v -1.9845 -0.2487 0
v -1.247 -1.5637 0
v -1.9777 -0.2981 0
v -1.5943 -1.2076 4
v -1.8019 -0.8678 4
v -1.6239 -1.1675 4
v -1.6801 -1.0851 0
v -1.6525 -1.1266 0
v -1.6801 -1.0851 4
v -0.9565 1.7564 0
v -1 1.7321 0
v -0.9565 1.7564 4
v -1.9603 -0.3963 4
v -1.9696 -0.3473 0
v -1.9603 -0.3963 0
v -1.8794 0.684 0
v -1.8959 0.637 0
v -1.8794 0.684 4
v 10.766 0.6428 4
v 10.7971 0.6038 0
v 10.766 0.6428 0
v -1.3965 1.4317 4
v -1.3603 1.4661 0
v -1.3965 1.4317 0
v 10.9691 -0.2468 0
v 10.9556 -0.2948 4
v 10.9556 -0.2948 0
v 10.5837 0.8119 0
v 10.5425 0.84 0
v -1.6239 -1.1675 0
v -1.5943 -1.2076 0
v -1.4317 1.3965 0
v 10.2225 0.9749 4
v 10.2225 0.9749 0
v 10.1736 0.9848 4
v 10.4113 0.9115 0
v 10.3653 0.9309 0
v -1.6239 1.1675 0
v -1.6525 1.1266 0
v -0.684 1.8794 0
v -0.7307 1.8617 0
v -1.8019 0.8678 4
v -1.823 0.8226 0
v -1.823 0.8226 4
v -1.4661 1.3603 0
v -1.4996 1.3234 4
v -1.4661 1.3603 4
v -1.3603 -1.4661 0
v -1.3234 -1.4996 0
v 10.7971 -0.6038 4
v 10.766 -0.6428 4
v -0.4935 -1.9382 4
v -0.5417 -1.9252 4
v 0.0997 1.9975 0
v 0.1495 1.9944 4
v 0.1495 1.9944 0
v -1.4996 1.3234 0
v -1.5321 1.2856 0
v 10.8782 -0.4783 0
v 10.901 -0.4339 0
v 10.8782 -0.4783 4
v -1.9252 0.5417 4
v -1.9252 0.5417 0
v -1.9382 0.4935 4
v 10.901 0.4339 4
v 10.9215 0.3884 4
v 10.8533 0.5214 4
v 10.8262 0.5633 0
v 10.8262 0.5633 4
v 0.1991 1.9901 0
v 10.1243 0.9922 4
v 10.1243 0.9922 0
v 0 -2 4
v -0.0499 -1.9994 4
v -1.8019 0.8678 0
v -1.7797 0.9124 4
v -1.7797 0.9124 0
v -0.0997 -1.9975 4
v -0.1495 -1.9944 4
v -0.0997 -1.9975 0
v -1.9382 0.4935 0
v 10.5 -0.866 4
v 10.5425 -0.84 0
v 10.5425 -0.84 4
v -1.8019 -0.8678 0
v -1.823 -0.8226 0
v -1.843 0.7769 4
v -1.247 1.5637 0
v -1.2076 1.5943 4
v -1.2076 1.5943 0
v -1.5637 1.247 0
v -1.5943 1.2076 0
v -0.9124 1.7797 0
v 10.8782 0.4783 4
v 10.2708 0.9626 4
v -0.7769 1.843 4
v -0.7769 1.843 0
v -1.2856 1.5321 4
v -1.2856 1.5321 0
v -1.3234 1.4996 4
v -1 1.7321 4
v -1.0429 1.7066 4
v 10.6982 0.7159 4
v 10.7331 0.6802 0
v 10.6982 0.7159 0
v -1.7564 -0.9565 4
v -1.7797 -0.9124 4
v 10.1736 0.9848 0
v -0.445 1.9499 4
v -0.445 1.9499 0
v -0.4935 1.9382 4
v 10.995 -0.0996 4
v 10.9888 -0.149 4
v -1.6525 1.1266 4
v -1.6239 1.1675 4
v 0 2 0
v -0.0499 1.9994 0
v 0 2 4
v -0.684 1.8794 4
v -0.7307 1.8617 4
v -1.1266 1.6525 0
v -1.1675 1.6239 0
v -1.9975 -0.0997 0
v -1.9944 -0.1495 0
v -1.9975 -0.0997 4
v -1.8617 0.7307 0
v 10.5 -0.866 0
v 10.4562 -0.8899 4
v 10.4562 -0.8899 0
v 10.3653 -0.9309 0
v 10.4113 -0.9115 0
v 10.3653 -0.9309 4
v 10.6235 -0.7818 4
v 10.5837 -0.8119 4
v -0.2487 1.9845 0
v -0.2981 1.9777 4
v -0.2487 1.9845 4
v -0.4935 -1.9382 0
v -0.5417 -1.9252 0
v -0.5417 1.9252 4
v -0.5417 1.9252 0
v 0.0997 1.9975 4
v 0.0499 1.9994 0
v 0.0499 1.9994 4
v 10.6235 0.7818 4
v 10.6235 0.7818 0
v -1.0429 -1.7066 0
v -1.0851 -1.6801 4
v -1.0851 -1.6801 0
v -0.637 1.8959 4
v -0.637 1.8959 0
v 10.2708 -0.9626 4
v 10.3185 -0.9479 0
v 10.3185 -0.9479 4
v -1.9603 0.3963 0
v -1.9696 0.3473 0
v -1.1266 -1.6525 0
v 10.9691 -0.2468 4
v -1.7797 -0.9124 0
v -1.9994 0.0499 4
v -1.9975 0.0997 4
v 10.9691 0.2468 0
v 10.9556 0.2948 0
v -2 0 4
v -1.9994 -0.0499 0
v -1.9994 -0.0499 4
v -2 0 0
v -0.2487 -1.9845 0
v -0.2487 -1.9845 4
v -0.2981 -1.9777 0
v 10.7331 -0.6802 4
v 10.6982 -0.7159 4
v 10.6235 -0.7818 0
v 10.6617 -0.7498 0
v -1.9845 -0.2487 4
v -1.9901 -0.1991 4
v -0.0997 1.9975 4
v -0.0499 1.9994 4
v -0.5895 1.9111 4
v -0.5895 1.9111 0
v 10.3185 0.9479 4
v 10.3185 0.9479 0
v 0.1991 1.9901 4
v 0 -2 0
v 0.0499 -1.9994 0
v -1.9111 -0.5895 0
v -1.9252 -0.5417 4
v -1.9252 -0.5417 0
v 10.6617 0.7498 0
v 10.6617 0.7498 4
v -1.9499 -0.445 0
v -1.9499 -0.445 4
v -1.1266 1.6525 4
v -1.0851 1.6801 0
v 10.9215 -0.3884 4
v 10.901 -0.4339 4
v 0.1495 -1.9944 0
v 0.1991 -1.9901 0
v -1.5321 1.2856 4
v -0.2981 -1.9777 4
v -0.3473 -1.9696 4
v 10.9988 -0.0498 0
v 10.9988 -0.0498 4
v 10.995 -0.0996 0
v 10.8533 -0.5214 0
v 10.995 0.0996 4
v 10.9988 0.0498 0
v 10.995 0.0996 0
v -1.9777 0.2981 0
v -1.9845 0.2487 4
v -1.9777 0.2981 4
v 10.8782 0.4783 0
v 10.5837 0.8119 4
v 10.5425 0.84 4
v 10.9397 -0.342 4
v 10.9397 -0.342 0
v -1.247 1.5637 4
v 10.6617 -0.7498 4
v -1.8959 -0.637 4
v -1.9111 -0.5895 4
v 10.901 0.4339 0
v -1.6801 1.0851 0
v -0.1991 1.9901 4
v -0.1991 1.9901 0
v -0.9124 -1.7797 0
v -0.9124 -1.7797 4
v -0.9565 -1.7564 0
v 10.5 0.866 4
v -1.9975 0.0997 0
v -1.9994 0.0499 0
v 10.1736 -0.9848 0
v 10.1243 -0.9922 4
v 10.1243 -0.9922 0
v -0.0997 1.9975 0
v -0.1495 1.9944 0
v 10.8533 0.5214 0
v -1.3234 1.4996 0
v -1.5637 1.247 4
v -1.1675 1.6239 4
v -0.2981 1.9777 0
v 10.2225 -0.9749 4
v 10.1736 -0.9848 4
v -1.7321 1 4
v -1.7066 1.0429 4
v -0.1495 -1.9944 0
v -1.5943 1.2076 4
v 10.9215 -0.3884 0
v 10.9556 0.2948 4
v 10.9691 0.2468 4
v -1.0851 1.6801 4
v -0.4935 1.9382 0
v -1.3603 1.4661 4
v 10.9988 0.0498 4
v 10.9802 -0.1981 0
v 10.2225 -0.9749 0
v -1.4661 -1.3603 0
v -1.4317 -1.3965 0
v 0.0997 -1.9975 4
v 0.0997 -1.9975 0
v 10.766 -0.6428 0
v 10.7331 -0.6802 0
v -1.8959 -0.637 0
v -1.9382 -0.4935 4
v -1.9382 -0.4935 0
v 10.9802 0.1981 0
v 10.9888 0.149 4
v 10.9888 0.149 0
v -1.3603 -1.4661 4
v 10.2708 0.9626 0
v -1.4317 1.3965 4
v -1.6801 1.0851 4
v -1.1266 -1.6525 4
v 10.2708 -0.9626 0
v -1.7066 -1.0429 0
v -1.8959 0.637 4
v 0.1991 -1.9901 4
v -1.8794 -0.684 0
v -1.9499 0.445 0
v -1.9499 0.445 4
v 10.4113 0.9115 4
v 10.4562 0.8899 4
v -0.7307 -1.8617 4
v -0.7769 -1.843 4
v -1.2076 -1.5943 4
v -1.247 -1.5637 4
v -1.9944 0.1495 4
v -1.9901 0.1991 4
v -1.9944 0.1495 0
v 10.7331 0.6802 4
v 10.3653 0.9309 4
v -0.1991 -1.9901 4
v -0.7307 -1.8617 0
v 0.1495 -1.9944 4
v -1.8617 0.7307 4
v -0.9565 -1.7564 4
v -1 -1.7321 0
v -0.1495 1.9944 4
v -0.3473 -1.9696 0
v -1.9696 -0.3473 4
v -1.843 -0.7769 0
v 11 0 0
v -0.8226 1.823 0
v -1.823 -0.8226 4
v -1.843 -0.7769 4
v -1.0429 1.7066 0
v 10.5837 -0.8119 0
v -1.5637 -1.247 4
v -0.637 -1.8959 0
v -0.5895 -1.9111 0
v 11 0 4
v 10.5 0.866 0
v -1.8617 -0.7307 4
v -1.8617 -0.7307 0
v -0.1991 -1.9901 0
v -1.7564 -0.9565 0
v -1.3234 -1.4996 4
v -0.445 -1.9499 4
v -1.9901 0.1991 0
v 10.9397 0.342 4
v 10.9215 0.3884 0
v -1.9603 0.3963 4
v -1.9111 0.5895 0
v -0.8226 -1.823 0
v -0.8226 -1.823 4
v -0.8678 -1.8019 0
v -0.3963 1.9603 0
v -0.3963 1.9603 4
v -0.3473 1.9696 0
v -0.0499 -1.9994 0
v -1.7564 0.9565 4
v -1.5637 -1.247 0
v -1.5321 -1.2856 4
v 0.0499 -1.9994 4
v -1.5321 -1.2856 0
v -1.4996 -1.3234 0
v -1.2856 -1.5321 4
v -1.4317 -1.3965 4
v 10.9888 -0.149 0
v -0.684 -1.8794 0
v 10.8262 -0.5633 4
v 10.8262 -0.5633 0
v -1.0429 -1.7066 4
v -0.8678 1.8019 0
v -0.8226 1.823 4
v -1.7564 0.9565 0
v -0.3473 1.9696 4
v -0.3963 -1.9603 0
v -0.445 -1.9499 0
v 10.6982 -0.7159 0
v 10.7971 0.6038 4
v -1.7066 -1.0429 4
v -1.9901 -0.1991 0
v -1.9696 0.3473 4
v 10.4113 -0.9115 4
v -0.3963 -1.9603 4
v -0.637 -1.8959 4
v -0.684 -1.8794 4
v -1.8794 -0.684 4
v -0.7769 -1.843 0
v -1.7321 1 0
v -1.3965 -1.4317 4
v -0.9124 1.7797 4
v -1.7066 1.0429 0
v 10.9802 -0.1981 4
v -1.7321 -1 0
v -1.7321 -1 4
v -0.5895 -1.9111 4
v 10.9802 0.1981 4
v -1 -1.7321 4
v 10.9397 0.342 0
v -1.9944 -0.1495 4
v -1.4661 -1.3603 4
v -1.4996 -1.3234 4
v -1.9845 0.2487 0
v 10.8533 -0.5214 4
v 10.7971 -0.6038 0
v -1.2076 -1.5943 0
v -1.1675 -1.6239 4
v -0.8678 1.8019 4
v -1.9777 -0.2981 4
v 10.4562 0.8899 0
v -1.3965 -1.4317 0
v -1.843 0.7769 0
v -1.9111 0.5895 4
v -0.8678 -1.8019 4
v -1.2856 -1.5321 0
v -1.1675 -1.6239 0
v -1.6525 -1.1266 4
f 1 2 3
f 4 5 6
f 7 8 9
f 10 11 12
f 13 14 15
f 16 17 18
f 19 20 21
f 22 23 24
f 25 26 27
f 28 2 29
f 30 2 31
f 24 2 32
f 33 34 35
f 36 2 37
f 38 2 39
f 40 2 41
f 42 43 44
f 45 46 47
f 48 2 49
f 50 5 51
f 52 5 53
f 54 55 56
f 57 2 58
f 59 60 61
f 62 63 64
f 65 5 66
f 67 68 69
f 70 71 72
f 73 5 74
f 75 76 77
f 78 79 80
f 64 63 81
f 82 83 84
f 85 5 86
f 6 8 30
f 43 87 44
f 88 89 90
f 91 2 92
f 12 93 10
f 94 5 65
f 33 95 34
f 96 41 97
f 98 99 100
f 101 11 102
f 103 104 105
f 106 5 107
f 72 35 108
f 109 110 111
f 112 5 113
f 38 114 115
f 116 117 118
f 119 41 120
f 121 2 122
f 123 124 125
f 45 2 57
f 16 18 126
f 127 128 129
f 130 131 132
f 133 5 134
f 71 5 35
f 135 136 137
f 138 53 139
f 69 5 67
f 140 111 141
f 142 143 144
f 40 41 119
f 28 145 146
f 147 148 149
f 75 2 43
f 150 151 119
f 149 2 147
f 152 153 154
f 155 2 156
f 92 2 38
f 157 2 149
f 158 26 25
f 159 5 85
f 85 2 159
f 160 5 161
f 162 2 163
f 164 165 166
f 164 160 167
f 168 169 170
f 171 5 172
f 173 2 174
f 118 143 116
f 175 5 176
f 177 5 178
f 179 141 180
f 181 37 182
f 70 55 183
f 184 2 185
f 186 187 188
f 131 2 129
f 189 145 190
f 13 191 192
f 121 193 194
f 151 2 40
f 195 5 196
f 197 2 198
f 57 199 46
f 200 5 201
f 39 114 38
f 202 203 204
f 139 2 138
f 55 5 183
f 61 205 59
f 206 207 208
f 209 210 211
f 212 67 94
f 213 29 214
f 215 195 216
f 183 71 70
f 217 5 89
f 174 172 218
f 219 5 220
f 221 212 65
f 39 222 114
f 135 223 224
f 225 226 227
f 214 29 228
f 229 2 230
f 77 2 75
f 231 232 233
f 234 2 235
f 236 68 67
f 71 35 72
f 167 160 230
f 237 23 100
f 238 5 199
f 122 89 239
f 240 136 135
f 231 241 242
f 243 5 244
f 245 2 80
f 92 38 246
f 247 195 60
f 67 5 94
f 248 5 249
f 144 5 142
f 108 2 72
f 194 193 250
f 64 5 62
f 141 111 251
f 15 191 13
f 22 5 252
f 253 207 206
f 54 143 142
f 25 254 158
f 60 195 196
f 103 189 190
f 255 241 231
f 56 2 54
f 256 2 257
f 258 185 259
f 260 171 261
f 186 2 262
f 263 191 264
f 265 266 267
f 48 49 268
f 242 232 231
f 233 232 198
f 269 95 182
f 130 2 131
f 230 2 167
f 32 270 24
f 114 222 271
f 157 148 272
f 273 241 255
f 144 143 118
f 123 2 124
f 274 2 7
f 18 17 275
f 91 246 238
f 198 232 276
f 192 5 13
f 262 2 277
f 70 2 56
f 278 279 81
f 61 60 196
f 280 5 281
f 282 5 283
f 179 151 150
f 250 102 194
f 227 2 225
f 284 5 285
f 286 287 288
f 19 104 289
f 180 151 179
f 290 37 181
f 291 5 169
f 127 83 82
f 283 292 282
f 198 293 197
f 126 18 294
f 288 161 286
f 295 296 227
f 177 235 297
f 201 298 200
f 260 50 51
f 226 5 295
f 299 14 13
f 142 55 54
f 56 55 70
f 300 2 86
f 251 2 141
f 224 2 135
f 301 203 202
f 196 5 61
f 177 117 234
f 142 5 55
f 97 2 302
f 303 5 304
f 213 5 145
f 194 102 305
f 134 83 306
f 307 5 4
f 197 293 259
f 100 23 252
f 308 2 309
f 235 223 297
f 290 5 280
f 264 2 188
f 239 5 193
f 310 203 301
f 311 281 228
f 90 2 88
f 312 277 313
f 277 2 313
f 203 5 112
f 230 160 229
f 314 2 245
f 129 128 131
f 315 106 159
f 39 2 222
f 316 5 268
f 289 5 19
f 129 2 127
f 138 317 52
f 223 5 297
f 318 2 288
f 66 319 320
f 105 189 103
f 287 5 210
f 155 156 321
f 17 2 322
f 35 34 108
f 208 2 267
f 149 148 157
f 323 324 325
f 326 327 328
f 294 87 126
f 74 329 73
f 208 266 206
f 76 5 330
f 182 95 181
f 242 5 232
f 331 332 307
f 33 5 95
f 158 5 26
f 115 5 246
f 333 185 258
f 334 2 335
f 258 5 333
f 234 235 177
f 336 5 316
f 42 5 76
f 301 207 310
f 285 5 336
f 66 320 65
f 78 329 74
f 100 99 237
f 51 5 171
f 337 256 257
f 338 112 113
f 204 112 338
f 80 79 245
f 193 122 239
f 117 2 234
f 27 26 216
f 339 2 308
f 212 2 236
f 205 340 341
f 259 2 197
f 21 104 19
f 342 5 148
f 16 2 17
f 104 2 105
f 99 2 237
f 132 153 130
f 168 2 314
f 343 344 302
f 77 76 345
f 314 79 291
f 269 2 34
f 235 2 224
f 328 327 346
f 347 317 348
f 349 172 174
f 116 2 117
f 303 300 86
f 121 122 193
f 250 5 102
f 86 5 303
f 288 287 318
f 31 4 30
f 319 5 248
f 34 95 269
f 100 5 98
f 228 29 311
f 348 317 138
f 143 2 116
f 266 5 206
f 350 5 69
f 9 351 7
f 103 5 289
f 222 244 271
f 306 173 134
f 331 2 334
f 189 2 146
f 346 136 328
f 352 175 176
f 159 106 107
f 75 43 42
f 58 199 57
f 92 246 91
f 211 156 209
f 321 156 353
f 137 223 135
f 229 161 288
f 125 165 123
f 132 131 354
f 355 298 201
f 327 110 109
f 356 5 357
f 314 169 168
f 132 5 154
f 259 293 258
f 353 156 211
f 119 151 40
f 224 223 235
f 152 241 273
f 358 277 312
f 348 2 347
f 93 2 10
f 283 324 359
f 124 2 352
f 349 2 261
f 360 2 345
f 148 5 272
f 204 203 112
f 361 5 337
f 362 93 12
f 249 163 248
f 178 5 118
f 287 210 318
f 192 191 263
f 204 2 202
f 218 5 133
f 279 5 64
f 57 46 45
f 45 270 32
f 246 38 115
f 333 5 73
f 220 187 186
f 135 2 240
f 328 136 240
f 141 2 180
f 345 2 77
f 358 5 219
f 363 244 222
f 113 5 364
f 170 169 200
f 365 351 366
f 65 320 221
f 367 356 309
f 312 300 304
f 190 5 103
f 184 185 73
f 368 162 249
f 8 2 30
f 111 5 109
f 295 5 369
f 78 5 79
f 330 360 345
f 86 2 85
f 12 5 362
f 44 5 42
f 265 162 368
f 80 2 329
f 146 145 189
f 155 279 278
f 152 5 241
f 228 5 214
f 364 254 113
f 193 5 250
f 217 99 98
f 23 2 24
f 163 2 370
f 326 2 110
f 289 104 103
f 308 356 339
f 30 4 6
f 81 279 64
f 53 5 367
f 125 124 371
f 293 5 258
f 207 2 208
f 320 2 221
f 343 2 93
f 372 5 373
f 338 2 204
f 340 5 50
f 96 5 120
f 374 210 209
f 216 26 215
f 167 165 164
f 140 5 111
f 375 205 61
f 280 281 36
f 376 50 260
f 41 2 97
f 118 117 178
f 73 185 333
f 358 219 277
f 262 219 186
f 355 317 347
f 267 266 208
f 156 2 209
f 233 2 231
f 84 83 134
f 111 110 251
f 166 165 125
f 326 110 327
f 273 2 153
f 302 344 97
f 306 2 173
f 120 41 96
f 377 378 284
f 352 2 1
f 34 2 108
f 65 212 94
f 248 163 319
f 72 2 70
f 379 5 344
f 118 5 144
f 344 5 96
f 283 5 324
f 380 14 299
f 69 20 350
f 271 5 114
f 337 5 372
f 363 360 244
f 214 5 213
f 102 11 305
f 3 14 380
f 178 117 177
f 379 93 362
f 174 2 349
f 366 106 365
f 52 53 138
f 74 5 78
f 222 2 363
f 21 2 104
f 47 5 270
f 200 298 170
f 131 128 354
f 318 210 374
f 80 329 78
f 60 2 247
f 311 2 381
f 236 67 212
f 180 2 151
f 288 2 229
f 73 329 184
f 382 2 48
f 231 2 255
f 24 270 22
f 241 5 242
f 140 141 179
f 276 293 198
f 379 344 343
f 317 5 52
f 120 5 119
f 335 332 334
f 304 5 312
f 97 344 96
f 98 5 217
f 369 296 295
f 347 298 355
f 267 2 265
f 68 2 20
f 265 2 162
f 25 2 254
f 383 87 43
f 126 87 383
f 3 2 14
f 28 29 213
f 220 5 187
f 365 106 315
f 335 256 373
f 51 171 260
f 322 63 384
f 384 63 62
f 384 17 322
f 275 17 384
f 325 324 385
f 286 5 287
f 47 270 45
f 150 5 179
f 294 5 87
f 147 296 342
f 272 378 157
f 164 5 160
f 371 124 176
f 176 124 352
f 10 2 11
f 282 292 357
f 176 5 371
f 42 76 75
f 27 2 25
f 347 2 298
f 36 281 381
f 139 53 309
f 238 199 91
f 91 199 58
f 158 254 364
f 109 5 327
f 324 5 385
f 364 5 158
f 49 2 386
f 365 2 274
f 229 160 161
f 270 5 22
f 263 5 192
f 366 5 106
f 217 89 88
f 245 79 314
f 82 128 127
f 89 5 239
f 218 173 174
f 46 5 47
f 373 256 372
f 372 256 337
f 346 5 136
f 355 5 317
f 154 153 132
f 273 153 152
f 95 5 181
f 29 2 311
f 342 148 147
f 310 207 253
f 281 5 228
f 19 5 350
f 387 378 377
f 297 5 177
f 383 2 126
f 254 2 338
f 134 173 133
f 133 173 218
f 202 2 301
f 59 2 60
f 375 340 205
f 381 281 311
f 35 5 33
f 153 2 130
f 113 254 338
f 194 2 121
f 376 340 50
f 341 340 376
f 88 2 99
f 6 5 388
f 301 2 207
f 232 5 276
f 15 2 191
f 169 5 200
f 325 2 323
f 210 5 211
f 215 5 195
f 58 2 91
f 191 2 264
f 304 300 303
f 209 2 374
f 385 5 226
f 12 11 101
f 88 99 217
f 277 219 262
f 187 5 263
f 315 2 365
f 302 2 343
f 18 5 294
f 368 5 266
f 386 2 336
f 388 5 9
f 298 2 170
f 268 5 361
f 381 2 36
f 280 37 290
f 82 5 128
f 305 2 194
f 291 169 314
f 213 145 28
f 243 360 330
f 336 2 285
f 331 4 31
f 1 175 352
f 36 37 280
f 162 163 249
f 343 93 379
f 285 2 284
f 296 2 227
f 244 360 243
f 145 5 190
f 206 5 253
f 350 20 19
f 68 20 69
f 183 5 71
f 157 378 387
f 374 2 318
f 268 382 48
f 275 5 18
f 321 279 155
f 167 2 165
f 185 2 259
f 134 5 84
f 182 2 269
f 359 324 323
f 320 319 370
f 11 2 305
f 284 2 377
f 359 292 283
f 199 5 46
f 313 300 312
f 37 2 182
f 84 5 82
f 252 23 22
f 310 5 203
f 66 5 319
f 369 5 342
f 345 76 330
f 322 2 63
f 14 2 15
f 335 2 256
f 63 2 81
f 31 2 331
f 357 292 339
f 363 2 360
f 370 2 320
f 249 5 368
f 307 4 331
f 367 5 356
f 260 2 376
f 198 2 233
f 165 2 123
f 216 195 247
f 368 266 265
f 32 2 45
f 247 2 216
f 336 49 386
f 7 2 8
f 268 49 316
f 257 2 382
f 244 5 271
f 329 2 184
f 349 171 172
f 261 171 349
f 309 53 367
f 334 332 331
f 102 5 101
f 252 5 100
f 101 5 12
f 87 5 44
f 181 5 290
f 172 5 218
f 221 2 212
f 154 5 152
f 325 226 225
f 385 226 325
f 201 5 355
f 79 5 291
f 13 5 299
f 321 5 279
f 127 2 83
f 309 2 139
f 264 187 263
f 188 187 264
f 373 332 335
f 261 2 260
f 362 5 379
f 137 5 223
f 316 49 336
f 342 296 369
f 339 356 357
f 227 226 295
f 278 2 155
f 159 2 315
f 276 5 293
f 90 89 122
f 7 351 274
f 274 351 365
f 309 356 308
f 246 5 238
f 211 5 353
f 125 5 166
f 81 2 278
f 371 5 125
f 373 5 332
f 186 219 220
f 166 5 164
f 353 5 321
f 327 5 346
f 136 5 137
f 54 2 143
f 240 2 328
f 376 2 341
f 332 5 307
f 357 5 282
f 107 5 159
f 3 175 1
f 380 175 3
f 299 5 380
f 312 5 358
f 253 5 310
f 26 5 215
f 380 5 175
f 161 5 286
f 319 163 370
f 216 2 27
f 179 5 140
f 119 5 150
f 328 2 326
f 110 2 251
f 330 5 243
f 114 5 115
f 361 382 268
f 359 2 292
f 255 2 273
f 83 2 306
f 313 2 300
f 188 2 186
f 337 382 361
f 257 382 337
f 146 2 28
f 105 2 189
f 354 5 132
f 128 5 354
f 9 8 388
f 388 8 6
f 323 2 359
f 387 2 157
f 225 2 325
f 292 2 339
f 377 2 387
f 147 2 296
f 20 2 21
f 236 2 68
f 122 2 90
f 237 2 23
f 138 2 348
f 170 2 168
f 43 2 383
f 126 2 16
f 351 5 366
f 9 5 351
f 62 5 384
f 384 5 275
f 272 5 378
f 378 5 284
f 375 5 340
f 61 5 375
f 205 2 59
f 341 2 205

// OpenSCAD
// hull() must tessellate with the facet settings in scope, not with the built-in defaults.
$fa = 1;
$fs = 0.05;
hull() { cylinder(r = 2, h = 4); translate([10, 0, 0]) cylinder(r = 1, h = 4); }
